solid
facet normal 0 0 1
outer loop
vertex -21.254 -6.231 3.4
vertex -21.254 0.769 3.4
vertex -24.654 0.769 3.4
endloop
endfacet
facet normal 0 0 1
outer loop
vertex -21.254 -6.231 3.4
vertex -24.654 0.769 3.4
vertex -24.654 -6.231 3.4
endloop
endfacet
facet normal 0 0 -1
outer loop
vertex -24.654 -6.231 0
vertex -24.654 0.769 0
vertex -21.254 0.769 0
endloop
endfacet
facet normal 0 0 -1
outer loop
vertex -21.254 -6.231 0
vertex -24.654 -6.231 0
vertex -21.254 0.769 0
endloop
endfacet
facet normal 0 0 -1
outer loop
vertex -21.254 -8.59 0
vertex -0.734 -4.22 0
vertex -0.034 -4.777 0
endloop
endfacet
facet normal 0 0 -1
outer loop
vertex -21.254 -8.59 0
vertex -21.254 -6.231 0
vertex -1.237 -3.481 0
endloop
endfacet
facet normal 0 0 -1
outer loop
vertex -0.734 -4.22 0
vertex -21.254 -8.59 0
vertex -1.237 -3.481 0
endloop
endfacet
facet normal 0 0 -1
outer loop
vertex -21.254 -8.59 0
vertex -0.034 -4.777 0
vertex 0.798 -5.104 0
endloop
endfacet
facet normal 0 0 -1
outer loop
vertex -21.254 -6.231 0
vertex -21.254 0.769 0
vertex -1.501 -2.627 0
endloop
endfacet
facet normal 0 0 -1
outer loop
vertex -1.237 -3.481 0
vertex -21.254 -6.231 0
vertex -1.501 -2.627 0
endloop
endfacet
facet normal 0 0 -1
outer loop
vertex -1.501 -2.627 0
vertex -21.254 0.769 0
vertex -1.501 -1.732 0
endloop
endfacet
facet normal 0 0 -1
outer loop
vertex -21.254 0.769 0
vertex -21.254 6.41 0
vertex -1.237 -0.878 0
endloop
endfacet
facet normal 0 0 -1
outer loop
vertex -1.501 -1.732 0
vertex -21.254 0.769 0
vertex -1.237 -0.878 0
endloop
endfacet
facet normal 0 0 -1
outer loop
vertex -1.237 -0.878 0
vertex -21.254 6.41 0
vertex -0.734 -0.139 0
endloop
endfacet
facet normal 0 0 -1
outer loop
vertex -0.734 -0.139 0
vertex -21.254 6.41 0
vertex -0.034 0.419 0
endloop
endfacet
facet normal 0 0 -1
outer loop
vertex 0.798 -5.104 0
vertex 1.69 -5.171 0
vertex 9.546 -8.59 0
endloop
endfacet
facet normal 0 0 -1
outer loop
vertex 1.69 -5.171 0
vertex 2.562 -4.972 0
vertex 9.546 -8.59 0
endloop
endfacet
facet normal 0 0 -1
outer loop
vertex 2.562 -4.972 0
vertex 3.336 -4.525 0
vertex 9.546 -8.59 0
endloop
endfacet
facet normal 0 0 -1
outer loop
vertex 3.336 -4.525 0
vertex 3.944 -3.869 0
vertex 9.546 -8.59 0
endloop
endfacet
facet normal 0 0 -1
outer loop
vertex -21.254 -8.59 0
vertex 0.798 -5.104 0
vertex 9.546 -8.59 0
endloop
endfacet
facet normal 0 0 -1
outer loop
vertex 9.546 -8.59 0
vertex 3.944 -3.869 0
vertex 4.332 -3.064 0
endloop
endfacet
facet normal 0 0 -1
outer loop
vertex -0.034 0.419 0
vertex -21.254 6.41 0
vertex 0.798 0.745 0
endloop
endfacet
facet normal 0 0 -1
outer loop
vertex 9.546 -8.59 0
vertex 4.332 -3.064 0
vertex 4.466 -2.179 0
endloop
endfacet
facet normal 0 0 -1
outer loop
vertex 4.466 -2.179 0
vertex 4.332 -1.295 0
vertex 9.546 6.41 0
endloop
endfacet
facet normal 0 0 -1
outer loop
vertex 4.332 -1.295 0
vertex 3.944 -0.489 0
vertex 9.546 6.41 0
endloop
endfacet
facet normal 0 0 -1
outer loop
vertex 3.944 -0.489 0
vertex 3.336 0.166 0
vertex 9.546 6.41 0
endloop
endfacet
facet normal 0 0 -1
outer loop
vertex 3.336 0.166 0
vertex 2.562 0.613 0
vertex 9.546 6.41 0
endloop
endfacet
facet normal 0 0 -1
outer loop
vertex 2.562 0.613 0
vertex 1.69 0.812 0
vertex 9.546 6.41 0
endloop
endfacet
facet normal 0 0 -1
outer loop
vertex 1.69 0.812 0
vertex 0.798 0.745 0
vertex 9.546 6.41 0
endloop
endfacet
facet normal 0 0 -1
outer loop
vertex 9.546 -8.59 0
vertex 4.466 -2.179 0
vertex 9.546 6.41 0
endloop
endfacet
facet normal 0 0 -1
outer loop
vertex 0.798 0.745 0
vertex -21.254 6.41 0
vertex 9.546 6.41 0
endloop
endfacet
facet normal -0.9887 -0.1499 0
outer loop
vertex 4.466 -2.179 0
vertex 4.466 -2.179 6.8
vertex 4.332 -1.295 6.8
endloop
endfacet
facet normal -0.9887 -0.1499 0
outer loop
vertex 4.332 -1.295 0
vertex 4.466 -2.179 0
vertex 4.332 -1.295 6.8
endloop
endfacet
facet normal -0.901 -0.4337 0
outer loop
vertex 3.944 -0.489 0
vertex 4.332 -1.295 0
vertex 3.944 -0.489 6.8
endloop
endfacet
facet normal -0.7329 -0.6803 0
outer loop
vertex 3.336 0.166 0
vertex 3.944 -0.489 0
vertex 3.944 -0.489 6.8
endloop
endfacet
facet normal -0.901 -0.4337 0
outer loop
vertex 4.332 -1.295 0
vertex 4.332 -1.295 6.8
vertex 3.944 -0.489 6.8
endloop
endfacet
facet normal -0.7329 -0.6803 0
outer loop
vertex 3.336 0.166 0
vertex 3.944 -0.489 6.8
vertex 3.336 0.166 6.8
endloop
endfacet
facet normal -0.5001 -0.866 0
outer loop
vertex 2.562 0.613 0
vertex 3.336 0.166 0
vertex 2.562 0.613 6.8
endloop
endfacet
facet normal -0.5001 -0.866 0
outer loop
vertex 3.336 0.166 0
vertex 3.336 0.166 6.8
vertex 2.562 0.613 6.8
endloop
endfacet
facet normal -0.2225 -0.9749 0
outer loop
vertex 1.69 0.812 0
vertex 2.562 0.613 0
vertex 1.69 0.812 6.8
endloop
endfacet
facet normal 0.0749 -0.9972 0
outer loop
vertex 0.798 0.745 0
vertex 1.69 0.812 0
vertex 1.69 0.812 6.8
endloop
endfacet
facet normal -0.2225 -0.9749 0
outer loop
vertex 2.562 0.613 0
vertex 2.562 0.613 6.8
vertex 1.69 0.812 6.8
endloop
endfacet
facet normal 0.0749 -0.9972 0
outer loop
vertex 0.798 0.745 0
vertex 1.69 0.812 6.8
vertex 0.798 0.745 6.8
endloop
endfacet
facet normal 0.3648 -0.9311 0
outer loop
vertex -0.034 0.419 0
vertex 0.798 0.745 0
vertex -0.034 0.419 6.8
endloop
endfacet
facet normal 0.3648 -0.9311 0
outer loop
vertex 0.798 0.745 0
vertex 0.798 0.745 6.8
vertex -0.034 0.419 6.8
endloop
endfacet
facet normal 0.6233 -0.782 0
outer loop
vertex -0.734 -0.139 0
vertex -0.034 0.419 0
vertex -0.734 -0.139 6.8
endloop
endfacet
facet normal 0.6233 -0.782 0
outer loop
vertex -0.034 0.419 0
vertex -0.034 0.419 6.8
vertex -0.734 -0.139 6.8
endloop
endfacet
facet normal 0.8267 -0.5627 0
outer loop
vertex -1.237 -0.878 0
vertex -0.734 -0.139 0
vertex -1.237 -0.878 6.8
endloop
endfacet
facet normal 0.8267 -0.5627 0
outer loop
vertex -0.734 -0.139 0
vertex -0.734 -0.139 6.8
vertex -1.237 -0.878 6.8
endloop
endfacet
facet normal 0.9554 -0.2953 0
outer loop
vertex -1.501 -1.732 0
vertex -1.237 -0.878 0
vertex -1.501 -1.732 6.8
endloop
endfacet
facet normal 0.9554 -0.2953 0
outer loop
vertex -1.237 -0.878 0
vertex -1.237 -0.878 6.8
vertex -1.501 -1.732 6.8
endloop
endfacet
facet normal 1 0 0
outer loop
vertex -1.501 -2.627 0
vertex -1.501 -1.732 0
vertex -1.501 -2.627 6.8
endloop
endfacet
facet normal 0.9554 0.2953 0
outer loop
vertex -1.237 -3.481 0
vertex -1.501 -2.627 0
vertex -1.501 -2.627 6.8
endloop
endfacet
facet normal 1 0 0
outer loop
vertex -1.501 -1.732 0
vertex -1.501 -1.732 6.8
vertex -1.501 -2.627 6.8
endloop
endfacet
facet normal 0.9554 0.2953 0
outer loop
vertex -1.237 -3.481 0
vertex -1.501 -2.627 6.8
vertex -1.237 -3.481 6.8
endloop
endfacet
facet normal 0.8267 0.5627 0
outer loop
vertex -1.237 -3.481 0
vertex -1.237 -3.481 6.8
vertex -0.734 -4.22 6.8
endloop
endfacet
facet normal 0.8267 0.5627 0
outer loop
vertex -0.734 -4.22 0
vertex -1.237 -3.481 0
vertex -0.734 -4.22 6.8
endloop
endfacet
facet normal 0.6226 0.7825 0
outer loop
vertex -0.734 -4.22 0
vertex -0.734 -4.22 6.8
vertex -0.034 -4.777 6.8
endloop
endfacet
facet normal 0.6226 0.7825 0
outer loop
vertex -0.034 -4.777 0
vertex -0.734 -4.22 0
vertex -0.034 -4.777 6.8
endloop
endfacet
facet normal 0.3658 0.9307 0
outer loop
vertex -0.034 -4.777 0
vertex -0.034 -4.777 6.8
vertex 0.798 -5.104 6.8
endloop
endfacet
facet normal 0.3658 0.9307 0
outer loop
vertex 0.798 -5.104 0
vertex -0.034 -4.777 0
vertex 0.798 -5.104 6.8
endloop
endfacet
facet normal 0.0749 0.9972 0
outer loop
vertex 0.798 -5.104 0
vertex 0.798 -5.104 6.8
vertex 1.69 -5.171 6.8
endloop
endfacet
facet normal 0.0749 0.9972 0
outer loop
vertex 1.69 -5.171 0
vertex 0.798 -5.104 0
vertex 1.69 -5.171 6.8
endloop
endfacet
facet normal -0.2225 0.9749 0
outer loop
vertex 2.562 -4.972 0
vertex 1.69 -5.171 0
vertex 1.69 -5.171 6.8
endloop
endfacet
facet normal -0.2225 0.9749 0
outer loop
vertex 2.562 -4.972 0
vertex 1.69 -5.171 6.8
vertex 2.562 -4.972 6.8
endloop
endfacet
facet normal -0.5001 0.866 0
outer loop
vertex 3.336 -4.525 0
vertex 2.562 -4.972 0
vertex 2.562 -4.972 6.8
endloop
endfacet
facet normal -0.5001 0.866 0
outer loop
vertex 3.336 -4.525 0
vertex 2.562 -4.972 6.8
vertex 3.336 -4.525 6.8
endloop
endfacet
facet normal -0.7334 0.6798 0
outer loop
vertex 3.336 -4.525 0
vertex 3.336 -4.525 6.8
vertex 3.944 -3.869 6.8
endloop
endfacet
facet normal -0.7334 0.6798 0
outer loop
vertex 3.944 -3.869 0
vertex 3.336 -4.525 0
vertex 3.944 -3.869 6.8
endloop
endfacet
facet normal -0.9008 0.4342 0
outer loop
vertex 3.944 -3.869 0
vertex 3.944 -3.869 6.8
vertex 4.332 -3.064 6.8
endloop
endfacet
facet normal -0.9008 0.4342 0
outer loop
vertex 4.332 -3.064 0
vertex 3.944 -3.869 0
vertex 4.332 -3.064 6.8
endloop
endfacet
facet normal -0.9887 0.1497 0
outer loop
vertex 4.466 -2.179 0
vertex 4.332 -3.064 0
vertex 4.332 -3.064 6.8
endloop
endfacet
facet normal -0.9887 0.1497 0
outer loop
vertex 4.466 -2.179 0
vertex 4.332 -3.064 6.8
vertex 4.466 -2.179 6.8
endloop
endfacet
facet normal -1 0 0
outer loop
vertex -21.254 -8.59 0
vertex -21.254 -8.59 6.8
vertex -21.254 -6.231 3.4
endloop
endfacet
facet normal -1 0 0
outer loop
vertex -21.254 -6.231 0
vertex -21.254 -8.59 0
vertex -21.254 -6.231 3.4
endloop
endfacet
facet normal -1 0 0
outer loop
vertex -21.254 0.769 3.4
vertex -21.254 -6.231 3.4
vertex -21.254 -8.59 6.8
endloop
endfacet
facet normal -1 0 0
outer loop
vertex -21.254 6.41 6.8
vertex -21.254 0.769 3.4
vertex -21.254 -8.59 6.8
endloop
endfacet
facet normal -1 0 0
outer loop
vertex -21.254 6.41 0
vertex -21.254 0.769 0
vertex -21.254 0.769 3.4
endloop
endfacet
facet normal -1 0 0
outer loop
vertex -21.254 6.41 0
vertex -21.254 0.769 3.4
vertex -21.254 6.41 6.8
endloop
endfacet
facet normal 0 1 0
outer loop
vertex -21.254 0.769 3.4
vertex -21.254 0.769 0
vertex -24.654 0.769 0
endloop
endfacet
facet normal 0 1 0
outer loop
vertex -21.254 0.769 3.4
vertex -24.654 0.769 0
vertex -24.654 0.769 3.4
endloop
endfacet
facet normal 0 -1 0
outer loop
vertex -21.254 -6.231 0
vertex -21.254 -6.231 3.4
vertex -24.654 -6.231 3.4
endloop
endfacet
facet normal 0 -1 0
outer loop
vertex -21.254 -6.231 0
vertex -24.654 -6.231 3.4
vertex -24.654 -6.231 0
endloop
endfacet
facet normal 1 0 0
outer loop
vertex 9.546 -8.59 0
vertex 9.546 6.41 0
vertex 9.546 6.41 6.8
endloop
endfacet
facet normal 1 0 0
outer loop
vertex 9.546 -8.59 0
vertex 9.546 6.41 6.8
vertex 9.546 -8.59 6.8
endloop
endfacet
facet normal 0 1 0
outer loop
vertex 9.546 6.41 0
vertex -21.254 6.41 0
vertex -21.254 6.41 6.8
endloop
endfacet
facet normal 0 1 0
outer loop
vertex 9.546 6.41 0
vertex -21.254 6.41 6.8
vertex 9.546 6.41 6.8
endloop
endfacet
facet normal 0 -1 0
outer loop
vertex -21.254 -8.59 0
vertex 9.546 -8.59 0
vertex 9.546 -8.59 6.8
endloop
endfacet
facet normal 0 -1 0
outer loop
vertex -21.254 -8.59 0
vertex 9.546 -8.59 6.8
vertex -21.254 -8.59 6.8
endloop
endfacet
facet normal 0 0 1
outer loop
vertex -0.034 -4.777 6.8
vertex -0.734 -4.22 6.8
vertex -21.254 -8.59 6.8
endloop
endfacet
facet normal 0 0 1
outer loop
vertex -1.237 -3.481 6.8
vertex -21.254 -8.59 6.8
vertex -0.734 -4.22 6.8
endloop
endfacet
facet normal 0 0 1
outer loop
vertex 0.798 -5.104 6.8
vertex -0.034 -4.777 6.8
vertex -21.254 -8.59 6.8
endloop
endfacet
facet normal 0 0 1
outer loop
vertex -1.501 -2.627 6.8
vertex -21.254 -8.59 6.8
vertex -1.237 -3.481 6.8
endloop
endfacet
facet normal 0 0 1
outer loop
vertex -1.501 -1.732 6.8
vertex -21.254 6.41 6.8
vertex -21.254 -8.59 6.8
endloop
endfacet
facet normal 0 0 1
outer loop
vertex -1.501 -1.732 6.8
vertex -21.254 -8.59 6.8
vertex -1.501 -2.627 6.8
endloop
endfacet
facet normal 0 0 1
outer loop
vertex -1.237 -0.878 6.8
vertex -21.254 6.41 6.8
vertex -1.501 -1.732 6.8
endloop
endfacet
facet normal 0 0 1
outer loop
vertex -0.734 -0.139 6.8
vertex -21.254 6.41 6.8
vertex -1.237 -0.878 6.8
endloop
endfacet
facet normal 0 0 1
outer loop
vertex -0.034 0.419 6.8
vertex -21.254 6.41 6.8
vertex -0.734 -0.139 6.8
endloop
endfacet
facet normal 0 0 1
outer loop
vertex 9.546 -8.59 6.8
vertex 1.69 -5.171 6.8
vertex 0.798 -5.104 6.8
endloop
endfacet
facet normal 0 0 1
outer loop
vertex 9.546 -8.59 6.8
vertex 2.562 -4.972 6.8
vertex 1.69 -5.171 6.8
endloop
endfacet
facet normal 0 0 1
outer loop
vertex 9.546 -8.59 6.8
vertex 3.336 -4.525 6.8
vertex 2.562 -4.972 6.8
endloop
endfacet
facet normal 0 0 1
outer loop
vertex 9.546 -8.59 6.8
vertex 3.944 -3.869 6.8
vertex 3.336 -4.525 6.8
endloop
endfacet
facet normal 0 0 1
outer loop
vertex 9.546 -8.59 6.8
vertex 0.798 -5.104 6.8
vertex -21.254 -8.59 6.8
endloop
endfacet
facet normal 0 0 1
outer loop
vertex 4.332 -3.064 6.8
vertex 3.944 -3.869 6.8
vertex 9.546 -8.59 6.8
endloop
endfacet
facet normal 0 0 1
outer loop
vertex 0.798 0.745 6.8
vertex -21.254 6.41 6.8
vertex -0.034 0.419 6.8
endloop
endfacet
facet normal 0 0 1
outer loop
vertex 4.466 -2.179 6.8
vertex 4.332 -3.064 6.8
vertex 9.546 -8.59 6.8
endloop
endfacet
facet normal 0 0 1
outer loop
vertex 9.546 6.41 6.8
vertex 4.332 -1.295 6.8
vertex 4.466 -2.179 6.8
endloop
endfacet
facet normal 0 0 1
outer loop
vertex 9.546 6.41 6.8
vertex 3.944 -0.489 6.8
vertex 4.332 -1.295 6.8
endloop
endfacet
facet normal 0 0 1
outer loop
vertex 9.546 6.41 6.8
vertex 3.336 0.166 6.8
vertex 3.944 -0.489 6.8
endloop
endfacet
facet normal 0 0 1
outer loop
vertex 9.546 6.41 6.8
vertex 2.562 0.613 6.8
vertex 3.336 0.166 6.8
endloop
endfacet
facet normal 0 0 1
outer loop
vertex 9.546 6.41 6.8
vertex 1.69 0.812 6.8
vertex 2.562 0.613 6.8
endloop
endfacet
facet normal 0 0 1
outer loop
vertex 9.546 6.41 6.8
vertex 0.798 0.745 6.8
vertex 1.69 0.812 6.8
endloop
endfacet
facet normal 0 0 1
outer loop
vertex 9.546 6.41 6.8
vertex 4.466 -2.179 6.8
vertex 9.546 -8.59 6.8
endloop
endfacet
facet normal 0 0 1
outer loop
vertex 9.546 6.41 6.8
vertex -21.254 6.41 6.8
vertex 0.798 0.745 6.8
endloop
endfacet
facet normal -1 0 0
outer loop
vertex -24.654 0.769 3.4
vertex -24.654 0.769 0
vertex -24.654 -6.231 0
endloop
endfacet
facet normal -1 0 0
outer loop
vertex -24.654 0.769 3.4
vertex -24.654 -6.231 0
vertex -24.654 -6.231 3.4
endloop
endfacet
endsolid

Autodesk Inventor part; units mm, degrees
ref_plane "YZ Plane" through (0, 0, 0) normal (1, 0, 0) x (0, 1, 0)
ref_plane "XZ Plane" through (0, 0, 0) normal (0, 1, 0) x (-1, 0, 0)
ref_plane "XY Plane" through (0, 0, 0) normal (0, 0, 1) x (1, 0, 0)
sketch "Sketch1" plane through (0, 0, 0) normal (0, 0, 1) x (1, 0, 0)
  line L0 (-21.2538, 6.4099) -> (9.5462, 6.4099)
  line L1 (9.5462, 6.4099) -> (9.5462, -8.5901)
  line L2 (9.5462, -8.5901) -> (-21.2538, -8.5901)
  line L3 (-21.2538, -8.5901) -> (-21.2538, 6.4099)
  line L4 (1.0462, -38.9134) -> (26.8462, -38.9134)
  line L5 (-4.9538, -50.9134) -> (0.0462, -50.9134)
  point P0 (0, 0)
  dimension "d0" = 30.8
  dimension "d1" = 15
  dimension "d8" = 25.8
  dimension "d9" = 5
extrude "Extrusion1" add sketch "Sketch1" along normal blind 6.8
sketch "Sketch2" plane through (0, 0, 6.8) normal (0, 0, 1) x (1, 0, 0)
  circle A0 centre (1.4656, -2.1794) radius 3 projected
  circle A1 centre (1.4656, -2.1794) radius 3
  point P0 (0, 0)
extrude "Extrusion2" cut sketch "Sketch2" against normal blind 14
sketch "Sketch3" plane through (0, 0, 0) normal (0, 0, -1) x (-1, 0, 0)
  line L0 (5.4538, -4.4054) -> (8.8538, -4.4054) projected
  line L1 (5.4538, 2.5946) -> (8.8538, 2.5946) projected
  line L2 (8.8538, 84.2919) -> (8.8538, -65.7081) projected
  line L3 (5.4538, -4.4054) -> (8.8538, -4.4054)
  line L4 (8.8538, -4.4054) -> (8.8538, 2.5946)
  line L5 (8.8538, 2.5946) -> (5.4538, 2.5946)
  line L6 (5.4538, 2.5946) -> (5.4538, -4.4054)
  point P0 (0, 0)
extrude "Extrusion3" add sketch "Sketch3" against normal blind 3.4
sketch "Sketch4" plane through (-21.2538, -8.5901, 0) normal (-1, 0, 0) x (0, 0, 1)
  line L0 (3.4, 2.3591) -> (0, 2.3591)
  line L1 (3.4, 9.3591) -> (3.4, 2.3591)
  line L2 (3.4, 2.3591) -> (0, 2.3591)
  line L3 (0, 2.3591) -> (0, 9.3591)
  line L4 (0, 9.3591) -> (3.4, 9.3591)
  line L5 (3.4, 9.3591) -> (3.4, 2.3591)
  point P0 (0, 8.5901)
extrude "Extrusion4" add sketch "Sketch4" along normal blind 3.4
equation "\"d0\" = d8 + d9"
properties part number "Fixer"
